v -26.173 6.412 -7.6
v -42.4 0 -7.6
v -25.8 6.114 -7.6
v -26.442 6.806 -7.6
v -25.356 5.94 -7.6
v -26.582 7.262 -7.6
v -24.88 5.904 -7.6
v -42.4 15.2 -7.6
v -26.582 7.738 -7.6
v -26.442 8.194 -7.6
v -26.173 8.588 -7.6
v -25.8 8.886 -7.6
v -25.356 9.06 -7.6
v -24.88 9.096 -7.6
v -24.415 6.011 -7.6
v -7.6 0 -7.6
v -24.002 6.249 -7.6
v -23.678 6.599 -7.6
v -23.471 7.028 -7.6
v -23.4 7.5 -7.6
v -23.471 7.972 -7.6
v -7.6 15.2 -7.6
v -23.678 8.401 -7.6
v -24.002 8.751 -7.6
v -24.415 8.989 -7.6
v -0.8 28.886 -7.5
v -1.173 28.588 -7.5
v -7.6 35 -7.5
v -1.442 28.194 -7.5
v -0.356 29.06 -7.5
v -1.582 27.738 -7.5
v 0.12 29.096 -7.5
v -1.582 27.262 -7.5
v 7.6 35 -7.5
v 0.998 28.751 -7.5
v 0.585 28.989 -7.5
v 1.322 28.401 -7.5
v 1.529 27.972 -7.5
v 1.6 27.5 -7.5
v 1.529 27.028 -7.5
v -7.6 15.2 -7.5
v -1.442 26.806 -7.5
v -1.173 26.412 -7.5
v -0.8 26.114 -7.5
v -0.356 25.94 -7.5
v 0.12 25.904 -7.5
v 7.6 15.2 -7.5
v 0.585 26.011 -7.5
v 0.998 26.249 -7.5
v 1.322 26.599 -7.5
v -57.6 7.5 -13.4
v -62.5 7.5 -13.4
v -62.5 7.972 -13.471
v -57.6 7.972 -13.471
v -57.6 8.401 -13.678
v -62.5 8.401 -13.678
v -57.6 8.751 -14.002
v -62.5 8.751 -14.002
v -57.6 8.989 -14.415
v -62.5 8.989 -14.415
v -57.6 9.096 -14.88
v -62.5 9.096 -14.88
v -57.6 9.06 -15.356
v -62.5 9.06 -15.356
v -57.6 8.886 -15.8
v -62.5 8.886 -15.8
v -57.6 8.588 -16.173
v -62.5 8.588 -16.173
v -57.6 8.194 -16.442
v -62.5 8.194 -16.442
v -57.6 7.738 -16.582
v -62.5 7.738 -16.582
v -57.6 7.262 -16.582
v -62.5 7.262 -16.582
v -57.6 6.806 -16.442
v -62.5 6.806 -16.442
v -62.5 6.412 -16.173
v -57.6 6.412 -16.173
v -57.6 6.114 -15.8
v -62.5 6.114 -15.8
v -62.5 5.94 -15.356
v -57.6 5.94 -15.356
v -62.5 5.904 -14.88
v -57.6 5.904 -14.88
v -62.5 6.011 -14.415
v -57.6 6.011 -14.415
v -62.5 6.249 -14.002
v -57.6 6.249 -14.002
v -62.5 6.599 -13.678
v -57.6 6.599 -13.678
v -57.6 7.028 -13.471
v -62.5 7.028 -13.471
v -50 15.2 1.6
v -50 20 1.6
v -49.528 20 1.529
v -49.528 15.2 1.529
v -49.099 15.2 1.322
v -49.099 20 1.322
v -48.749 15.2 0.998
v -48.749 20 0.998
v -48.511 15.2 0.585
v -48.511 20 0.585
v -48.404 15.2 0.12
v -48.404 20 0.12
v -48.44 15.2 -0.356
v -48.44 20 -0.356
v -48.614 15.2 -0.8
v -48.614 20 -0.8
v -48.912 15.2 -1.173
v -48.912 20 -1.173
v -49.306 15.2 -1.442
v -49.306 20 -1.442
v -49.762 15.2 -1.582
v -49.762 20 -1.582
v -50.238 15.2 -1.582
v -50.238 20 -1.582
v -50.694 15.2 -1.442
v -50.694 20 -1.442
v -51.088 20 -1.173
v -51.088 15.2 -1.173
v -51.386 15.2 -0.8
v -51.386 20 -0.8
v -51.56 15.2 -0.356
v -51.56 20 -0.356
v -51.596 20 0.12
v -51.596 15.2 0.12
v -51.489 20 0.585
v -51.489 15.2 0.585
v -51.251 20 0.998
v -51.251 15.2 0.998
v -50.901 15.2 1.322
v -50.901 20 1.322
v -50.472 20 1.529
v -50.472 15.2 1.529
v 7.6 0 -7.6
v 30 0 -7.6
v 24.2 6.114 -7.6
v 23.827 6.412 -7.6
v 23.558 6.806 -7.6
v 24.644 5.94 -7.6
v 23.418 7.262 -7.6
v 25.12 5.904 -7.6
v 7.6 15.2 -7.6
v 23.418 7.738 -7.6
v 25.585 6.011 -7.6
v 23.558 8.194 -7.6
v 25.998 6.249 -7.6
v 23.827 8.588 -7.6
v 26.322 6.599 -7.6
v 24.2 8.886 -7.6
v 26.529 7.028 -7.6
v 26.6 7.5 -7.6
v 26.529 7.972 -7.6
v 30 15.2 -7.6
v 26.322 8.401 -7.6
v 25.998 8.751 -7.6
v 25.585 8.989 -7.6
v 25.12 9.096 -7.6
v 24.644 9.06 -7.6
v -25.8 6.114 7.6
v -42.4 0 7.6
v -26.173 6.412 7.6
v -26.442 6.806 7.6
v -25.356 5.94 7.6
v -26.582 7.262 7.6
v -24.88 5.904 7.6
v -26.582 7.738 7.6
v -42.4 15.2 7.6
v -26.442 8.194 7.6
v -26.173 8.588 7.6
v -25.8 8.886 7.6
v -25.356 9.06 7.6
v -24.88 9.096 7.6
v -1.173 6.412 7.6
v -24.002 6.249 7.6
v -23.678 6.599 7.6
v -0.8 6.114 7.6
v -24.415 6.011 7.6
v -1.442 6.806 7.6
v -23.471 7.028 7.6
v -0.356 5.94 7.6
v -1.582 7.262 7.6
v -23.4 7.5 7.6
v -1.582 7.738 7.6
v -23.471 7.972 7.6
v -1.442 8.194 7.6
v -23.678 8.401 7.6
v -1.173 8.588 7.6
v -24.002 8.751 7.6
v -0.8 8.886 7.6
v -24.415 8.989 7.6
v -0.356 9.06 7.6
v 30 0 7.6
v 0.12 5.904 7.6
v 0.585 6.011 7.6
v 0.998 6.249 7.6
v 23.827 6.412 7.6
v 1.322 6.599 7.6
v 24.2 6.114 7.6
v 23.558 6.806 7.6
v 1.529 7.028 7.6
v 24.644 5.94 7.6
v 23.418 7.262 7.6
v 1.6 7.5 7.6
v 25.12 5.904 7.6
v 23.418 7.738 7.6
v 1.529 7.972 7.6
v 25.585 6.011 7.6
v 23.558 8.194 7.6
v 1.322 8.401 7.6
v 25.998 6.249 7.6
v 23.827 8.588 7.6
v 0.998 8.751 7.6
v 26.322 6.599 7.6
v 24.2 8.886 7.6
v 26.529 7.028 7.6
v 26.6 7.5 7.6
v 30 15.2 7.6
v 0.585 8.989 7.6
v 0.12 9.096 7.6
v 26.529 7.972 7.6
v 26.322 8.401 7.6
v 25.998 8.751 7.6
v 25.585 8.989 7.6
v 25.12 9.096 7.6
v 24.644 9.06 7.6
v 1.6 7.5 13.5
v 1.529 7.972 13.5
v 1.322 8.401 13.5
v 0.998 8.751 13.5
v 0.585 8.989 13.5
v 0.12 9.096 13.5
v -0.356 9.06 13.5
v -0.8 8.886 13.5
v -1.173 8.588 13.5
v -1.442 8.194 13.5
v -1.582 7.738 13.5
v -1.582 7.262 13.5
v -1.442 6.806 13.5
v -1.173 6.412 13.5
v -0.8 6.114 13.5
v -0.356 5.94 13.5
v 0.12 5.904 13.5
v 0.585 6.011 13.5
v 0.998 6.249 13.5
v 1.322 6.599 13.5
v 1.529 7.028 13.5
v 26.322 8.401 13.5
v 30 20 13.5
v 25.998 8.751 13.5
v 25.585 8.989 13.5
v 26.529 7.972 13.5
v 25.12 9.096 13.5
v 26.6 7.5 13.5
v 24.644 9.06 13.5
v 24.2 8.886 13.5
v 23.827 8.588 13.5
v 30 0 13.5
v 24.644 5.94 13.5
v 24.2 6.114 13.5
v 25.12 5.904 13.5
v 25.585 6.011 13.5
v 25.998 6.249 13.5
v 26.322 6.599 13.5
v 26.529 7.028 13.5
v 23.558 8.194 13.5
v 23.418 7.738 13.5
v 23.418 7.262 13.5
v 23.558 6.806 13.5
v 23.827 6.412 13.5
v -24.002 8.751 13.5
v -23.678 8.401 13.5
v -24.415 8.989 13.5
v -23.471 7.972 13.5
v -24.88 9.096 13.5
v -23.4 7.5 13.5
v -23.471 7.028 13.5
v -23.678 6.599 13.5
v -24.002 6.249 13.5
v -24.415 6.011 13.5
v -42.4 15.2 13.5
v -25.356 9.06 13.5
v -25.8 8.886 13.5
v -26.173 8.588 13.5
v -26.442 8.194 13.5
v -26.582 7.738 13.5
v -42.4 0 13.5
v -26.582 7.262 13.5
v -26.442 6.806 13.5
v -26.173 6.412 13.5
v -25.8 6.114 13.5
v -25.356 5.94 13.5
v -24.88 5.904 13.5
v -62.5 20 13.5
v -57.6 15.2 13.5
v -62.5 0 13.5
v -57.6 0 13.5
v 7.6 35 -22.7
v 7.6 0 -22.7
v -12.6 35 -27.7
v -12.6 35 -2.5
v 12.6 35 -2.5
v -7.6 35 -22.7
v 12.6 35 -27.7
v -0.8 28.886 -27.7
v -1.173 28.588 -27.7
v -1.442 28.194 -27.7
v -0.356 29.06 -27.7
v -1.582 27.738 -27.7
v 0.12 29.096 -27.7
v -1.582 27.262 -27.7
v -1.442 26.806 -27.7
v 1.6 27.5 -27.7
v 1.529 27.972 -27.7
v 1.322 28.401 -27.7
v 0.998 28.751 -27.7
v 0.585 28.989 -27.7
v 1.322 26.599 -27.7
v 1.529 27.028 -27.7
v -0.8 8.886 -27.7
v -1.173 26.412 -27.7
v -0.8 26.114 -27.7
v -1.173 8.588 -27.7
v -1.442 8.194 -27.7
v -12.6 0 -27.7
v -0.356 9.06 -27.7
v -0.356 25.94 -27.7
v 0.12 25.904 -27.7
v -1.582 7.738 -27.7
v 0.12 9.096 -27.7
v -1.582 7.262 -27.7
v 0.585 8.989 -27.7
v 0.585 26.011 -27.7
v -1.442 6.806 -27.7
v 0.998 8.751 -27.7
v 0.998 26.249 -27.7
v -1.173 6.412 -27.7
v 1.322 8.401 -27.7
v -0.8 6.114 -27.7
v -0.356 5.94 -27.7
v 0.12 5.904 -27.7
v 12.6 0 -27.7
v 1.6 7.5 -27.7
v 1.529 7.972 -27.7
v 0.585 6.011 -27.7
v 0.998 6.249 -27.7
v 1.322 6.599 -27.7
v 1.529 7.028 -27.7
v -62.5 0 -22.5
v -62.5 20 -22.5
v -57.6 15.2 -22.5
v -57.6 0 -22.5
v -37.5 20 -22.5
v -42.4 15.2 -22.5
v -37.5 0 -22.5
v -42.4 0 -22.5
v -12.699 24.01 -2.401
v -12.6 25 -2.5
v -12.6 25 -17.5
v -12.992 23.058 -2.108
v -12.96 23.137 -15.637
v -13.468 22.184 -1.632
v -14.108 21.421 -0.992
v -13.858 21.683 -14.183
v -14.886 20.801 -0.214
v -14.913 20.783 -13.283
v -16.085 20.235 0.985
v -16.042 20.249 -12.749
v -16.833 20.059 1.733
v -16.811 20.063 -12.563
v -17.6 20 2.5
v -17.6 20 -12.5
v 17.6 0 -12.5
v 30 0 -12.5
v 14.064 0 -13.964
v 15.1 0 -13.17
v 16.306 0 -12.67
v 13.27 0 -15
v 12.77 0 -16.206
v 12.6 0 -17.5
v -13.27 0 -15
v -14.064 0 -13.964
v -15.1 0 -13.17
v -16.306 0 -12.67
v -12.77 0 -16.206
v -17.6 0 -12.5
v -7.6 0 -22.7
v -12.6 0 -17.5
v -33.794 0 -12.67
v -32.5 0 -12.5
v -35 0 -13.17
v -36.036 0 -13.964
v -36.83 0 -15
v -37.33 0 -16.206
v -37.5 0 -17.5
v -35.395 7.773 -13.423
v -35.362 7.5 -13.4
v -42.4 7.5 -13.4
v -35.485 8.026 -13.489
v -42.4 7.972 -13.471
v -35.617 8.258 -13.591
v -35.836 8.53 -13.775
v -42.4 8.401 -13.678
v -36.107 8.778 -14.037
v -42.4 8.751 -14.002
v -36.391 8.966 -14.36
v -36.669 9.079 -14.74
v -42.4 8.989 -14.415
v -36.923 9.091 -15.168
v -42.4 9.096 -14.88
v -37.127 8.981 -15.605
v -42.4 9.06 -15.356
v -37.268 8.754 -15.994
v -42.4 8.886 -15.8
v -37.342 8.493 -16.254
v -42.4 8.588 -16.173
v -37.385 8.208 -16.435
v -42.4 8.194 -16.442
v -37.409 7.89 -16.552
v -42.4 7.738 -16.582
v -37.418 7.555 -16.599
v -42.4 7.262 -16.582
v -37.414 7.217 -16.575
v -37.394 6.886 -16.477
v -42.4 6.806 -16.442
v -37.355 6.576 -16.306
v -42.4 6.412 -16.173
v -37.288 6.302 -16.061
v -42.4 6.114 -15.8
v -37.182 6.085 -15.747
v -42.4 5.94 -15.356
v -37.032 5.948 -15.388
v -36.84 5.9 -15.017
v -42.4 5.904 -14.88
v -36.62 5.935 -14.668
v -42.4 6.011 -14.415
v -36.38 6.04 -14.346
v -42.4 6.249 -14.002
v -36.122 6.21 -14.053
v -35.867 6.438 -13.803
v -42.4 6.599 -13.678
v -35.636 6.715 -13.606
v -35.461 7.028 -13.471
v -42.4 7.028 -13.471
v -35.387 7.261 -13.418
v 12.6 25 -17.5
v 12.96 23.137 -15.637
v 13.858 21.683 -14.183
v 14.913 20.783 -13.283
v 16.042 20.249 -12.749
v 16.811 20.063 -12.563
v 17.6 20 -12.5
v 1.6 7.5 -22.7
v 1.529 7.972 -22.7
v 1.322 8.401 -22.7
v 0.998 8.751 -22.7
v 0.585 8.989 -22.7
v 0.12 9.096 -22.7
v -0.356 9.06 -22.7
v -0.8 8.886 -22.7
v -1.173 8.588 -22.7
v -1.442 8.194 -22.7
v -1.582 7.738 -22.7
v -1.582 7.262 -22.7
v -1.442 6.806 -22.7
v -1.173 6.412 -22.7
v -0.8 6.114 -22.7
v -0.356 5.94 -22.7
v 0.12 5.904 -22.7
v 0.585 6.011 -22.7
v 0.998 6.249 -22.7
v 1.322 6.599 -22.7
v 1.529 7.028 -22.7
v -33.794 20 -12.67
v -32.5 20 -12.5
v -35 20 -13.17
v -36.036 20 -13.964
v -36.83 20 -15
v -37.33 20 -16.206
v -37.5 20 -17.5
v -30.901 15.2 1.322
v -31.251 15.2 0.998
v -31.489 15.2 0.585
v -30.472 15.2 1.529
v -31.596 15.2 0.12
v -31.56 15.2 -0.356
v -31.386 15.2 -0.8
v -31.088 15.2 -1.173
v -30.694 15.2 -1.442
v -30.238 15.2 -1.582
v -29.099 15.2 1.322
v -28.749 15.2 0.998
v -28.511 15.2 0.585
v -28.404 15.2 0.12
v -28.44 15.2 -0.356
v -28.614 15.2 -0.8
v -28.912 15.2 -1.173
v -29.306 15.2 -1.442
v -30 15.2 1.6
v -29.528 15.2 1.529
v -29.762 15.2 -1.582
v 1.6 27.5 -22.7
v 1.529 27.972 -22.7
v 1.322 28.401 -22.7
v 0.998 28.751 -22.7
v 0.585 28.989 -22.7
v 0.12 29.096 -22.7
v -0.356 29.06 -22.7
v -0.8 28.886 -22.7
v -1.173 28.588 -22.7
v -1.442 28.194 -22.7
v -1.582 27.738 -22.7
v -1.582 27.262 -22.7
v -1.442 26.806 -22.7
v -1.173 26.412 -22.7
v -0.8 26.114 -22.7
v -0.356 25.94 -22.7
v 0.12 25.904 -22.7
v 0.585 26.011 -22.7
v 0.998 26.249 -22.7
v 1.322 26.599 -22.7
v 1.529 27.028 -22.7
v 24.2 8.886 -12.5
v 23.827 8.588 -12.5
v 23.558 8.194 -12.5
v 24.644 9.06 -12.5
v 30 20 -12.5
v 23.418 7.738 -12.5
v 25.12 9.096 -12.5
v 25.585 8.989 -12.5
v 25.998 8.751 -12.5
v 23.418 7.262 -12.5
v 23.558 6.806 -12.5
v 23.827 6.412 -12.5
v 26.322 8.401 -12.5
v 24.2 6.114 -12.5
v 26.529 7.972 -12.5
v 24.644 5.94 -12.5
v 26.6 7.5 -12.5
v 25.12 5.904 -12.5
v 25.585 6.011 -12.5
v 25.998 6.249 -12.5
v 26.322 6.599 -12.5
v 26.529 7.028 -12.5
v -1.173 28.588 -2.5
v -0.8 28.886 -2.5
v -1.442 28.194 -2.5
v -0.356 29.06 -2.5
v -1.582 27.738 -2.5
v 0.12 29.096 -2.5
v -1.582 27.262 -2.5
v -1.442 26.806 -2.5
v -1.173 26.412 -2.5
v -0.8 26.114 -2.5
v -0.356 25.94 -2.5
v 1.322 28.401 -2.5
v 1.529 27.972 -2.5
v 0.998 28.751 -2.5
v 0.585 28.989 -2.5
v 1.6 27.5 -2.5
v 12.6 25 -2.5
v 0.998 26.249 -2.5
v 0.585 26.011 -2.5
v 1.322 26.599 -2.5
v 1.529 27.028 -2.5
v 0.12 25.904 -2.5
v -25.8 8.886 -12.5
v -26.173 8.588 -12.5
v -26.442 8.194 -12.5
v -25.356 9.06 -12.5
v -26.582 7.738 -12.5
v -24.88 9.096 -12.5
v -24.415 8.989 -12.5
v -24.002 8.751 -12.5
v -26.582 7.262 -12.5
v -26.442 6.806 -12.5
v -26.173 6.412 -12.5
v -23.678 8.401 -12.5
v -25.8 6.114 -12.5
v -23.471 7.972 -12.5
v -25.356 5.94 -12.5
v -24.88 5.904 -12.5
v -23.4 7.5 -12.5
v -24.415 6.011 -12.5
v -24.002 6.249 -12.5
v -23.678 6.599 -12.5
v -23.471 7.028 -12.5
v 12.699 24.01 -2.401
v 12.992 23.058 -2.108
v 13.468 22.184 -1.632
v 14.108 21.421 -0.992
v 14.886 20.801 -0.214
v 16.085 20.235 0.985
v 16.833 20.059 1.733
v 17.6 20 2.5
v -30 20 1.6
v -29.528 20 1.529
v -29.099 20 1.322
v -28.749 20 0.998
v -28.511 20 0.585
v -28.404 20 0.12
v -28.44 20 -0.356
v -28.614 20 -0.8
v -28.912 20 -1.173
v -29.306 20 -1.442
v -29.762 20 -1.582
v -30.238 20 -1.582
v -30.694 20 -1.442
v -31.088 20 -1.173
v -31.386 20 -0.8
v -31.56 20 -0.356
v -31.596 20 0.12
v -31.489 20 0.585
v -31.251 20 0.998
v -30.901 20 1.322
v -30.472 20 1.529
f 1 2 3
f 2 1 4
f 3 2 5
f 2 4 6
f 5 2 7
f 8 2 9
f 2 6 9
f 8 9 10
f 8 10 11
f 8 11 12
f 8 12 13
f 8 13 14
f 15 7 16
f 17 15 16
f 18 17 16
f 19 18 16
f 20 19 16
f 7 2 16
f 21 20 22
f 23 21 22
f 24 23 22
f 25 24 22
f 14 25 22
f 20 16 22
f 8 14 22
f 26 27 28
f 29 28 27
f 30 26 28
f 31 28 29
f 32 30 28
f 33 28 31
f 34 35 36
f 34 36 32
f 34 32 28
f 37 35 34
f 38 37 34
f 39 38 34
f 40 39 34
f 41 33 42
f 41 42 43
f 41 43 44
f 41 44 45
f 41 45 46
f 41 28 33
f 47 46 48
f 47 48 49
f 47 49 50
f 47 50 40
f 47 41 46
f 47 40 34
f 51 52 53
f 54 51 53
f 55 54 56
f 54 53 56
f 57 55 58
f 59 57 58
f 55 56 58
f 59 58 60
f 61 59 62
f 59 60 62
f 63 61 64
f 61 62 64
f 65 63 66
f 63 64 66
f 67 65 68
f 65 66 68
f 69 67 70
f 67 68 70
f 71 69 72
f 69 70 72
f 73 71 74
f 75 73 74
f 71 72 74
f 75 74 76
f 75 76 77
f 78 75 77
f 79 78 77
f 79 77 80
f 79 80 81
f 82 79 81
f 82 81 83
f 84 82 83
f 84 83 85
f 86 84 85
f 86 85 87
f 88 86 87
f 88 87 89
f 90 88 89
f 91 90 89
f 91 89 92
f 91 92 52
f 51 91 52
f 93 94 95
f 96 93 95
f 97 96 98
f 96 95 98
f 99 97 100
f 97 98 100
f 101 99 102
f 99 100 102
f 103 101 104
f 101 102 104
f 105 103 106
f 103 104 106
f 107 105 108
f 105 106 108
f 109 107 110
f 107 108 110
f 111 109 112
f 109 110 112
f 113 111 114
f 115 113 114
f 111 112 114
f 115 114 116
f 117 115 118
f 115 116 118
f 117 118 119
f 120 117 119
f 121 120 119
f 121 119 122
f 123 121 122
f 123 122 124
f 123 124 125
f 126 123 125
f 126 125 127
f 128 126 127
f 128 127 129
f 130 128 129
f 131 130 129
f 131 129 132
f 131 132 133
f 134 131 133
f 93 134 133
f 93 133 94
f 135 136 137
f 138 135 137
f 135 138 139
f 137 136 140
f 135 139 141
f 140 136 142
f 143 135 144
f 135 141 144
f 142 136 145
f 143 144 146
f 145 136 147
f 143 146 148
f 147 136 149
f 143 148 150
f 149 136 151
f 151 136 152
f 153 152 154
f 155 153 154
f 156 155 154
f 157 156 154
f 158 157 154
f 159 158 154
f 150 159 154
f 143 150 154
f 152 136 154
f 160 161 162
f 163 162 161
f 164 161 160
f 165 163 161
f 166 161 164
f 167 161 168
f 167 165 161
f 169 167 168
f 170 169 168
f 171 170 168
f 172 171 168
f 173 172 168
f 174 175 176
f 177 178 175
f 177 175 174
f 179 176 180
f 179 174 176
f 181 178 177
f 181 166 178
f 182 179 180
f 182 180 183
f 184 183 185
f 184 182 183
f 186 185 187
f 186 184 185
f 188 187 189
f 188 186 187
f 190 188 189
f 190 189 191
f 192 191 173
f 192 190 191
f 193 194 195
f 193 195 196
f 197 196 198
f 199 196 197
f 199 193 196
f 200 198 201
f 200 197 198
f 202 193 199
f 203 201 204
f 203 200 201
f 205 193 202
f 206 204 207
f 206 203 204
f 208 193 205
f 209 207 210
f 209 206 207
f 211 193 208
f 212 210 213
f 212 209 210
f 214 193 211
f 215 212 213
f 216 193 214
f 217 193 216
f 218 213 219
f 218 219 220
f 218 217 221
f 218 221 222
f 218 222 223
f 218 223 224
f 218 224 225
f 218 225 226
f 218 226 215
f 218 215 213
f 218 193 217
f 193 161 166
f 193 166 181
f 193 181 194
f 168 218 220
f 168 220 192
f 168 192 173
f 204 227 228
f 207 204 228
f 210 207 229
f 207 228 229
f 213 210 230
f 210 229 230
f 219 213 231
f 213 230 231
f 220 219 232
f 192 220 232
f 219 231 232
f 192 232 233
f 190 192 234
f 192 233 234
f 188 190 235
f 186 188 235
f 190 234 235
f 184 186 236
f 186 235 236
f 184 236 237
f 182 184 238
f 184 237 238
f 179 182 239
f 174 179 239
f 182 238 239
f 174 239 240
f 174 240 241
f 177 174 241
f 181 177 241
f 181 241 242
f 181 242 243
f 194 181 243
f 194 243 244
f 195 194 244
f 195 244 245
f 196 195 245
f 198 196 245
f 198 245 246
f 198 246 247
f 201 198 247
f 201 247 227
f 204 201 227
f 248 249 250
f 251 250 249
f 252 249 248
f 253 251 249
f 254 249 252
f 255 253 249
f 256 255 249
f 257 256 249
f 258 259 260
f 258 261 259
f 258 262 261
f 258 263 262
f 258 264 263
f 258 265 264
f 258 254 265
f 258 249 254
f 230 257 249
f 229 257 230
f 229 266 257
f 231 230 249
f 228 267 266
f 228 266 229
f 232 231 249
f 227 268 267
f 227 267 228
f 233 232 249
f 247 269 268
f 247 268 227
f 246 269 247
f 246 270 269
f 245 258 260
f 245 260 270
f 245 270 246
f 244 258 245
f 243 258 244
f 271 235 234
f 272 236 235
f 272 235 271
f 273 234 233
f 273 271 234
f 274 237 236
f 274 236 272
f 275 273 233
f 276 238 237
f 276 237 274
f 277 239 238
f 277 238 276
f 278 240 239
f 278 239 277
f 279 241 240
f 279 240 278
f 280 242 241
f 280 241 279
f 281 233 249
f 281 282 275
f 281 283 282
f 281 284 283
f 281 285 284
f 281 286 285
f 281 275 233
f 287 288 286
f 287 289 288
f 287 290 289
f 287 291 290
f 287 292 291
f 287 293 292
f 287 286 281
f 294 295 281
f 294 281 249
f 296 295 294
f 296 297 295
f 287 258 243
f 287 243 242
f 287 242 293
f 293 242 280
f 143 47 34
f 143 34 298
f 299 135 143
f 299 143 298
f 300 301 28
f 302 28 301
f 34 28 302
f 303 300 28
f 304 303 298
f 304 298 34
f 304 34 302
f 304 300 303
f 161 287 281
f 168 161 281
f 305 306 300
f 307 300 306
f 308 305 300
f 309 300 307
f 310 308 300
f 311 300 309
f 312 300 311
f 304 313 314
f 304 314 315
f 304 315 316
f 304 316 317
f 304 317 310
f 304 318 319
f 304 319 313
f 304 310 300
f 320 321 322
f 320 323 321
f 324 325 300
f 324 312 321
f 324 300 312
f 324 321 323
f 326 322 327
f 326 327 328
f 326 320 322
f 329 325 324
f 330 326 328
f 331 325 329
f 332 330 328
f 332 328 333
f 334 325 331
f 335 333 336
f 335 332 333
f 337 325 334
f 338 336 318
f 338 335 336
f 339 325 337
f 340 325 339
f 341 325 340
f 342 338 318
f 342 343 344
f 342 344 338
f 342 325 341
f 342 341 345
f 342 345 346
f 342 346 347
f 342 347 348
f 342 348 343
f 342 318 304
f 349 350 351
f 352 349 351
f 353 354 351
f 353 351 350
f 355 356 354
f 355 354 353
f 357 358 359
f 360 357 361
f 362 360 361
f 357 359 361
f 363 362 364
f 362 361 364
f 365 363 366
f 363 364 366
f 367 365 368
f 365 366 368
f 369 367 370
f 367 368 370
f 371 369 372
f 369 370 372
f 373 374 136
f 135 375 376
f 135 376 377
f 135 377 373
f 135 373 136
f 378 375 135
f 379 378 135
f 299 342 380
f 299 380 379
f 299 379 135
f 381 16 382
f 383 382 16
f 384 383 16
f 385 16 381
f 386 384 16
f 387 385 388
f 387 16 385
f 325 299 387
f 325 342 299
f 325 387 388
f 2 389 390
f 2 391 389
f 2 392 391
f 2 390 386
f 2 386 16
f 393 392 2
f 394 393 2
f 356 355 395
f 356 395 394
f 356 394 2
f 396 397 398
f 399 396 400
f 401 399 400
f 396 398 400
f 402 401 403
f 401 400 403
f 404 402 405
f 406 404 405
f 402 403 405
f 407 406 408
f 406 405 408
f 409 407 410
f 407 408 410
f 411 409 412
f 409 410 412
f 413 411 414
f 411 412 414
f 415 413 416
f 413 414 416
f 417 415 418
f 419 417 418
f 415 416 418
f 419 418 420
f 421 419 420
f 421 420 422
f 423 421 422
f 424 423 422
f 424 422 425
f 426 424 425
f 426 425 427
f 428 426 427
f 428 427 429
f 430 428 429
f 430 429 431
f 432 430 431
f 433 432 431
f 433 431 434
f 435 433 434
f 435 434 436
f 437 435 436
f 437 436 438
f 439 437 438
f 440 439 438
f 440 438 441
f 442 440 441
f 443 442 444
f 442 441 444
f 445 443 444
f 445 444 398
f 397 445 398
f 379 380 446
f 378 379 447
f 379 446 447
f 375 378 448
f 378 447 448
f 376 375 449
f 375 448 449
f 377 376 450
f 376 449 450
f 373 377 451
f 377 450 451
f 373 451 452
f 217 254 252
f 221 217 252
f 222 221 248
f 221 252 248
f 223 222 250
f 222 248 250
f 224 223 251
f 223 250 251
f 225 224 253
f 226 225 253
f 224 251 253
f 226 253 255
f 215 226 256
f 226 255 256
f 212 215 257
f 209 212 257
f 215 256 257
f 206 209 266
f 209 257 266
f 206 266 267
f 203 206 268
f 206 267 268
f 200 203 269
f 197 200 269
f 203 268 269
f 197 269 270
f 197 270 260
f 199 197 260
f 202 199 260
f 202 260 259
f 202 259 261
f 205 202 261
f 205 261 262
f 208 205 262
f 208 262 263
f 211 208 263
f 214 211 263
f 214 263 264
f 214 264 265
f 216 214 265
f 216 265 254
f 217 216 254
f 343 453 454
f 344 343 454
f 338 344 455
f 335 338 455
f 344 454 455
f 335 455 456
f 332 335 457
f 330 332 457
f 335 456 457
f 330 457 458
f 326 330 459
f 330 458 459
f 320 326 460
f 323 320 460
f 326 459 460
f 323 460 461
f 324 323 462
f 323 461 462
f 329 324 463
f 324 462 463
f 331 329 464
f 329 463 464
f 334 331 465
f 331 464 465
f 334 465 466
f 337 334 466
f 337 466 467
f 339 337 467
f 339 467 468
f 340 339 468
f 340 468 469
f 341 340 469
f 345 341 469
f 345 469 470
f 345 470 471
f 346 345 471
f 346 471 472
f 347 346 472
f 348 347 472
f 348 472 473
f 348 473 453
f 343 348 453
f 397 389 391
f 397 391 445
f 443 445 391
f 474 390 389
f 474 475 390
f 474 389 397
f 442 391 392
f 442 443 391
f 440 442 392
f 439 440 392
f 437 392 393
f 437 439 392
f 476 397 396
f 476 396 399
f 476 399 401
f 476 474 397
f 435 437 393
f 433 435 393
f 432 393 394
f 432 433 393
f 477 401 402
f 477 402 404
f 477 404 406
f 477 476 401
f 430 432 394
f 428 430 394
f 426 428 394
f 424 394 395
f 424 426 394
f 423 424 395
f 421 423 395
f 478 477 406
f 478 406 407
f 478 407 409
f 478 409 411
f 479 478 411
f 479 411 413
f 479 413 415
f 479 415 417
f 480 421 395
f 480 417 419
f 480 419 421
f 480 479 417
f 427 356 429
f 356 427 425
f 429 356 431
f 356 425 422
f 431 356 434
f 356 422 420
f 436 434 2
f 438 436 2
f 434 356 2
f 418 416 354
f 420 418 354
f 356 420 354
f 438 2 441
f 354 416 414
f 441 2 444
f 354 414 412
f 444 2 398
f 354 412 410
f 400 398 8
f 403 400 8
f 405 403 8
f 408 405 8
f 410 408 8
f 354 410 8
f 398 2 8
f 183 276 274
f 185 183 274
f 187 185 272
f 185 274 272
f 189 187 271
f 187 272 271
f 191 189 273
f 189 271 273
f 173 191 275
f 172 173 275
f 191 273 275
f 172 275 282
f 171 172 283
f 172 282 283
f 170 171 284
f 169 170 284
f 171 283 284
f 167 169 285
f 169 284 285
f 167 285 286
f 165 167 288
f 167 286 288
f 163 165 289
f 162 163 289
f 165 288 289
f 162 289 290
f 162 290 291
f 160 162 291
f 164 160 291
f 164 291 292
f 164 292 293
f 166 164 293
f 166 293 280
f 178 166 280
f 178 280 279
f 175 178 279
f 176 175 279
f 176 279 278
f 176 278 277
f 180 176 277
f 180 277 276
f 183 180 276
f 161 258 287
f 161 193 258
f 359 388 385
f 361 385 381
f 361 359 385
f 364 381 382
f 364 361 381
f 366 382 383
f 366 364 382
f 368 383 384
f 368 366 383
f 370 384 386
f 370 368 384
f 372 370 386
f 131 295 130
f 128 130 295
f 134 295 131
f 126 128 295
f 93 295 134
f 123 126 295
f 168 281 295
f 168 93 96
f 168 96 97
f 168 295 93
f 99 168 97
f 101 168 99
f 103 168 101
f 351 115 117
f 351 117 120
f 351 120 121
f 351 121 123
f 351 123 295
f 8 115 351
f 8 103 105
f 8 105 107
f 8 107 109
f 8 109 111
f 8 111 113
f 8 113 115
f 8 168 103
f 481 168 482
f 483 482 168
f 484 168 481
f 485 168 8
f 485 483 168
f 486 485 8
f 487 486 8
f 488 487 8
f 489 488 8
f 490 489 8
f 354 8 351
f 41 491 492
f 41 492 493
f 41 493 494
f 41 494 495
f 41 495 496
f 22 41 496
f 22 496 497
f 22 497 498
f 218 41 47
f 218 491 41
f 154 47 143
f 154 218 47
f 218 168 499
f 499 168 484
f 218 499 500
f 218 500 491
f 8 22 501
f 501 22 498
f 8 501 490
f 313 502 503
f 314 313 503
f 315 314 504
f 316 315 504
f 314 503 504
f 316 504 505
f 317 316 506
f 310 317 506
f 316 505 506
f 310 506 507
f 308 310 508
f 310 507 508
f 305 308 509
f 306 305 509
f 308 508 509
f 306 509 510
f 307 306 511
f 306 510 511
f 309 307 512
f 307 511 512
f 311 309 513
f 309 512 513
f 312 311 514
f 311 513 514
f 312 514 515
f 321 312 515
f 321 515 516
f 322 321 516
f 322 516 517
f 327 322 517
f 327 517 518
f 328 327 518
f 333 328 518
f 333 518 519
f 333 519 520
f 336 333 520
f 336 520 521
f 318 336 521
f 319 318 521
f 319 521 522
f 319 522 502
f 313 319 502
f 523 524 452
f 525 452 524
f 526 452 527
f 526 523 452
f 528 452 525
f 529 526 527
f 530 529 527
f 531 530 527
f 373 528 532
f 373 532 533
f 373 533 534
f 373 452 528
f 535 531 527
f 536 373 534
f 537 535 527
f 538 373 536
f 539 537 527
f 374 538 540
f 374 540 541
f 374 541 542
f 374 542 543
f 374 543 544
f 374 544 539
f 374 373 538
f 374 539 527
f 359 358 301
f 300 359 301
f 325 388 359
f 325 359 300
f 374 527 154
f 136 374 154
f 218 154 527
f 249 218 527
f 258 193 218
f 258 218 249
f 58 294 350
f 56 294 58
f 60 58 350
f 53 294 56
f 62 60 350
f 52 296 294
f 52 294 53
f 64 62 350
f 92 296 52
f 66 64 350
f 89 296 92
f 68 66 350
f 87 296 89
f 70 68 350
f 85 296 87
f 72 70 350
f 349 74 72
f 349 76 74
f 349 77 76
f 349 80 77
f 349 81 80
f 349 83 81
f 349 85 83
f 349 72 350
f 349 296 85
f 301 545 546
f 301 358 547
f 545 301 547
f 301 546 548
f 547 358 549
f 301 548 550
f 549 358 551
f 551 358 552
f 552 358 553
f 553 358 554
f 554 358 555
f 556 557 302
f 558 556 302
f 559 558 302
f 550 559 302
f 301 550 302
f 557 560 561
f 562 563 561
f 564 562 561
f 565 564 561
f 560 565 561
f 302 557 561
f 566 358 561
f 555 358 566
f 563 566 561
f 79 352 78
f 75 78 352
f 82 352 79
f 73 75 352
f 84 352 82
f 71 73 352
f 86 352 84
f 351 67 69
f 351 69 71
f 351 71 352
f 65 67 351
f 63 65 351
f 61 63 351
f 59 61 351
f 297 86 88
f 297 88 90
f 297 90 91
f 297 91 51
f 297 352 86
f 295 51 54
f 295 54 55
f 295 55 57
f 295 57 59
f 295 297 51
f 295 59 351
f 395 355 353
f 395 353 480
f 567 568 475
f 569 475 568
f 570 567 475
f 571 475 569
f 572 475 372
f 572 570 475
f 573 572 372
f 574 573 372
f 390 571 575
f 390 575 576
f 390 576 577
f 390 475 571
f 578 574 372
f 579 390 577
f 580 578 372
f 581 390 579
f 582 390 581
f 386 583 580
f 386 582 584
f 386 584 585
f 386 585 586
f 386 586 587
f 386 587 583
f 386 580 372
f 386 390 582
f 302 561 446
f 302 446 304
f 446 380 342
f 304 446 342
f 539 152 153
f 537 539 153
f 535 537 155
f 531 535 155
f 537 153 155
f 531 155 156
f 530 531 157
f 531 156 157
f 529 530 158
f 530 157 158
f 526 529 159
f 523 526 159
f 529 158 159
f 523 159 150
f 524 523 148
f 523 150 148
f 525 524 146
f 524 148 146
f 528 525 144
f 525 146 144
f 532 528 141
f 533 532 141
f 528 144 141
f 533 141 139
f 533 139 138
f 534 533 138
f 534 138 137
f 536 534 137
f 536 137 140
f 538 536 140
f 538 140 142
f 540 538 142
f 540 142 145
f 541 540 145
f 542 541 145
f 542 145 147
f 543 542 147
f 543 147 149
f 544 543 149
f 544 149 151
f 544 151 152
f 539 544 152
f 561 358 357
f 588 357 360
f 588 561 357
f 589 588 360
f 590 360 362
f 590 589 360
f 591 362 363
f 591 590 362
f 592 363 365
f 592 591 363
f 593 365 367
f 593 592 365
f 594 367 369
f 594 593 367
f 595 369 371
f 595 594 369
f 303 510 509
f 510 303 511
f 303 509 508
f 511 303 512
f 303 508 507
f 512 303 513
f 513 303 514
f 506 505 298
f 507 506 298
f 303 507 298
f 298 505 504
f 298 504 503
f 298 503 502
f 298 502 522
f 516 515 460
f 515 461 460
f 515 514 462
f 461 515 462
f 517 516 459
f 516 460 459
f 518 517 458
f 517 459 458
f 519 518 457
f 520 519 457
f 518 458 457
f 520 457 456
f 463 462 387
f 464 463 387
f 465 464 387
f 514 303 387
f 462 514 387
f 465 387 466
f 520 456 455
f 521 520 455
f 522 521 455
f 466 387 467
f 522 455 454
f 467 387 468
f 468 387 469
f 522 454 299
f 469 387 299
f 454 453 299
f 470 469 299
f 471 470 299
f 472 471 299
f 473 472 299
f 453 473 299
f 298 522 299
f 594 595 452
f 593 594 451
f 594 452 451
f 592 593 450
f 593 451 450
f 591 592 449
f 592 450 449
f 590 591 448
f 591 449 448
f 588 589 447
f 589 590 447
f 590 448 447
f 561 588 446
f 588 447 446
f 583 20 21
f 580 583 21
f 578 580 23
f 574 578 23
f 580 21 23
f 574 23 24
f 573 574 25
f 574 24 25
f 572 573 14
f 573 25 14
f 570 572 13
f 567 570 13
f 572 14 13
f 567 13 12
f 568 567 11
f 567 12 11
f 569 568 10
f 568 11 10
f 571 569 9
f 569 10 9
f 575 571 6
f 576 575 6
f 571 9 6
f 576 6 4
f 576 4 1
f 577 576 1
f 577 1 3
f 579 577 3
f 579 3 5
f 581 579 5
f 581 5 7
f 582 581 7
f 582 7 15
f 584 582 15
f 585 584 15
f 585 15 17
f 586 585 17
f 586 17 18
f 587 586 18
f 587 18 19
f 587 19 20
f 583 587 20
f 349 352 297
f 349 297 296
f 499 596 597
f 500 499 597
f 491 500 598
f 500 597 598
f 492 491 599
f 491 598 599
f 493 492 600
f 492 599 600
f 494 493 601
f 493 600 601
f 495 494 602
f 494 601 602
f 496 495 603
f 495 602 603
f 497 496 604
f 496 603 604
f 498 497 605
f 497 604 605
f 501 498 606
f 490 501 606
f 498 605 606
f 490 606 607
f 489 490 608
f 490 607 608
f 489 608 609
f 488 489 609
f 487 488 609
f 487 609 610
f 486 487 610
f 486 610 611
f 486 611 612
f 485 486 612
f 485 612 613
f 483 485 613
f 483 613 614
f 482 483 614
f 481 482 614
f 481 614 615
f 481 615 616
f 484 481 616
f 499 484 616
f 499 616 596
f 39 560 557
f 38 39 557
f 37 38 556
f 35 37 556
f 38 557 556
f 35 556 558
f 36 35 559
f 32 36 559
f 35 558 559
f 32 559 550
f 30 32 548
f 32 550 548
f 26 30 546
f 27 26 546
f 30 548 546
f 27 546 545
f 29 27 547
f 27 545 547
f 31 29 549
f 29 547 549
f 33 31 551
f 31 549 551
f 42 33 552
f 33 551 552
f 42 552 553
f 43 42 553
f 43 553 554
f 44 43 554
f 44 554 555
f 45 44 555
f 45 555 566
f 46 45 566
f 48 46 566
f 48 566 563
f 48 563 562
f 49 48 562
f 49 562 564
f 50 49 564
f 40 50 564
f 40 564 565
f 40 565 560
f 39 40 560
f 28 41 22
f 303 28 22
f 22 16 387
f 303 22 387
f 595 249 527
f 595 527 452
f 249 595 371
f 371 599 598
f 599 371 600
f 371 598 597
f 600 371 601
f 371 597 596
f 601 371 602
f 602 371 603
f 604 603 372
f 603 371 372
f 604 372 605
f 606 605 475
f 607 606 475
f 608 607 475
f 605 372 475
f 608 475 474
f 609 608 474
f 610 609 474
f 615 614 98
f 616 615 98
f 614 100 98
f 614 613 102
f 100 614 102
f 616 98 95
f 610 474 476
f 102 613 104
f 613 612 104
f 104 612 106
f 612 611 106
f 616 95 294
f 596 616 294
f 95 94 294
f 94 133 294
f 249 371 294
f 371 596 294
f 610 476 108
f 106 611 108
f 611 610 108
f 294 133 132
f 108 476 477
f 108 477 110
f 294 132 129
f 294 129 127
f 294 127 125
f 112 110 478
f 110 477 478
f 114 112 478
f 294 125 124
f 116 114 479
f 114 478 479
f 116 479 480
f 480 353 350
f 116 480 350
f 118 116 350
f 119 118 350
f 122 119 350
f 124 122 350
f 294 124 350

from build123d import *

# Parameters (mm, degrees)
SKETCH_1_W               = 15.2
SKETCH_1_H               = 15.2
EXTRUDE_1_DEPTH          = 20
SKETCH_2_W               = 25.2
SKETCH_2_H               = 25.2
SKETCH_2_W_2             = 15.2
SKETCH_2_H_2             = 15.2
EXTRUDE_2_DEPTH          = 15
SKETCH_3_W               = 15.2
SKETCH_3_H               = 15.2
CUT_EXTRUDE_1_DEPTH      = 80
SKETCH_4_R               = 1.6
CUT_EXTRUDE_2_DEPTH      = 83.635888087
FILLET_1_R               = 5
SKETCH_5_W               = 15.2
SKETCH_5_H               = 15.2
CUT_EXTRUDE_3_DEPTH      = 83.635888087
CUT_EXTRUDE_4_REACH      = 104.706
CUT_EXTRUDE_4_END_RADIUS = 5
SKETCH_6_R               = 1.6
CUT_EXTRUDE_5_REACH      = 73.229
SKETCH_7_R               = 1.6


with BuildPart() as part:
    # 草图1 → 凸台-拉伸1 (new body)
    with BuildSketch(Plane(origin=(0, 0, 0), x_dir=(1, 0, 0), z_dir=(0, 1, 0))):
        Polygon((-37.5, 12.5), (-12.6, 12.5), (-12.6, 27.7), (12.6, 27.7), (12.6, 12.5), (30, 12.5), (30, -13.5), (-62.5, -13.5), (-62.5, 22.5), (-37.5, 22.5), align=None)
        with Locations((0, 15.1)):
            Rectangle(SKETCH_1_W, SKETCH_1_H, mode=Mode.SUBTRACT)
    extrude(amount=EXTRUDE_1_DEPTH)

    # 草图2 → 凸台-拉伸2 (add)
    with BuildSketch(Plane(origin=(0, 20, 0), x_dir=(1, 0, 0), z_dir=(0, 1, 0))):
        with Locations((0, 15.1)):
            Rectangle(SKETCH_2_W, SKETCH_2_H)
        with Locations((0, 15.1)):
            Rectangle(SKETCH_2_W_2, SKETCH_2_H_2, mode=Mode.SUBTRACT)
    extrude(amount=EXTRUDE_2_DEPTH)

    # 草图3 → 切除-拉伸1 (cut)
    with BuildSketch(Plane(origin=(30, 0, 0), x_dir=(0, 0, -1), z_dir=(1, 0, 0))):
        with Locations((0, 7.6)):
            Rectangle(SKETCH_3_W, SKETCH_3_H)
    extrude(amount=-CUT_EXTRUDE_1_DEPTH, mode=Mode.SUBTRACT)

    # 草图4 → 切除-拉伸2 (cut, through all)
    with BuildSketch(Plane.XY.offset(13.5)):
        with Locations((0, 7.5)):
            Circle(SKETCH_4_R)
        with Locations((25, 7.5)):
            Circle(SKETCH_4_R)
        with Locations((-25, 7.5)):
            Circle(SKETCH_4_R)
        with Locations((0, 27.5)):
            Circle(SKETCH_4_R)
    extrude(amount=-CUT_EXTRUDE_2_DEPTH, mode=Mode.SUBTRACT)

    # 圆角1
    fillet_1_edges = [part.edges().sort_by_distance(p)[0] for p in [
        (-37.5, 10, -12.5),
        (-12.6, 10, -12.5),
        (12.6, 10, -12.5),
        (-12.6, 20, -7.5),
        (0, 20, -2.5),
        (12.6, 20, -7.5),
    ]]
    fillet(fillet_1_edges, radius=FILLET_1_R)

    # 草图5 → 切除-拉伸3 (cut, through all)
    with BuildSketch(Plane.XY.offset(13.5)):
        with Locations((-50, 7.6)):
            Rectangle(SKETCH_5_W, SKETCH_5_H)
    extrude(amount=-CUT_EXTRUDE_3_DEPTH, mode=Mode.SUBTRACT)

    # 切除-拉伸4: up to this cylinder (the profile starts outside it)
    cut_extrude_4_end = Plane(origin=(-32.5, 7.5, -17.5), z_dir=(0, 1, 0)) * Cylinder(CUT_EXTRUDE_4_END_RADIUS, 220.412, mode=Mode.PRIVATE)
    # 草图6 → 切除-拉伸4 (cut, up to the surface)
    with BuildSketch(Plane.ZY.offset(62.5), mode=Mode.PRIVATE) as cut_extrude_4_sk1:
        with Locations((-15, 7.5)):
            Circle(SKETCH_6_R)
    cut_extrude_4_tool1 = extrude(cut_extrude_4_sk1.sketch, amount=-CUT_EXTRUDE_4_REACH, mode=Mode.PRIVATE) - cut_extrude_4_end
    add(cut_extrude_4_tool1.solids().sort_by_distance((-62.5, 7.5, -15))[0], mode=Mode.SUBTRACT)

    # 草图7 → 切除-拉伸5 (cut, up to next)
    with BuildSketch(Plane(origin=(0, 20, 0), x_dir=(1, 0, 0), z_dir=(0, 1, 0)), mode=Mode.PRIVATE) as cut_extrude_5_sk1:
        with Locations(Location((-50, 0, 0), (0, 0, 270))):
            Circle(SKETCH_7_R)
    cut_extrude_5_tool1 = extrude(cut_extrude_5_sk1.sketch, amount=-CUT_EXTRUDE_5_REACH, mode=Mode.PRIVATE) & part.part
    # 草图7 → 切除-拉伸5 (cut, up to next)
    with BuildSketch(Plane(origin=(0, 20, 0), x_dir=(1, 0, 0), z_dir=(0, 1, 0)), mode=Mode.PRIVATE) as cut_extrude_5_sk2:
        with Locations(Location((-30, 0, 0), (0, 0, 270))):
            Circle(SKETCH_7_R)
    cut_extrude_5_tool2 = extrude(cut_extrude_5_sk2.sketch, amount=-CUT_EXTRUDE_5_REACH, mode=Mode.PRIVATE) & part.part
    add(cut_extrude_5_tool1.solids().sort_by_distance((-50, 20, 0))[0], mode=Mode.SUBTRACT)
    add(cut_extrude_5_tool2.solids().sort_by_distance((-30, 20, 0))[0], mode=Mode.SUBTRACT)


solid = part.part
